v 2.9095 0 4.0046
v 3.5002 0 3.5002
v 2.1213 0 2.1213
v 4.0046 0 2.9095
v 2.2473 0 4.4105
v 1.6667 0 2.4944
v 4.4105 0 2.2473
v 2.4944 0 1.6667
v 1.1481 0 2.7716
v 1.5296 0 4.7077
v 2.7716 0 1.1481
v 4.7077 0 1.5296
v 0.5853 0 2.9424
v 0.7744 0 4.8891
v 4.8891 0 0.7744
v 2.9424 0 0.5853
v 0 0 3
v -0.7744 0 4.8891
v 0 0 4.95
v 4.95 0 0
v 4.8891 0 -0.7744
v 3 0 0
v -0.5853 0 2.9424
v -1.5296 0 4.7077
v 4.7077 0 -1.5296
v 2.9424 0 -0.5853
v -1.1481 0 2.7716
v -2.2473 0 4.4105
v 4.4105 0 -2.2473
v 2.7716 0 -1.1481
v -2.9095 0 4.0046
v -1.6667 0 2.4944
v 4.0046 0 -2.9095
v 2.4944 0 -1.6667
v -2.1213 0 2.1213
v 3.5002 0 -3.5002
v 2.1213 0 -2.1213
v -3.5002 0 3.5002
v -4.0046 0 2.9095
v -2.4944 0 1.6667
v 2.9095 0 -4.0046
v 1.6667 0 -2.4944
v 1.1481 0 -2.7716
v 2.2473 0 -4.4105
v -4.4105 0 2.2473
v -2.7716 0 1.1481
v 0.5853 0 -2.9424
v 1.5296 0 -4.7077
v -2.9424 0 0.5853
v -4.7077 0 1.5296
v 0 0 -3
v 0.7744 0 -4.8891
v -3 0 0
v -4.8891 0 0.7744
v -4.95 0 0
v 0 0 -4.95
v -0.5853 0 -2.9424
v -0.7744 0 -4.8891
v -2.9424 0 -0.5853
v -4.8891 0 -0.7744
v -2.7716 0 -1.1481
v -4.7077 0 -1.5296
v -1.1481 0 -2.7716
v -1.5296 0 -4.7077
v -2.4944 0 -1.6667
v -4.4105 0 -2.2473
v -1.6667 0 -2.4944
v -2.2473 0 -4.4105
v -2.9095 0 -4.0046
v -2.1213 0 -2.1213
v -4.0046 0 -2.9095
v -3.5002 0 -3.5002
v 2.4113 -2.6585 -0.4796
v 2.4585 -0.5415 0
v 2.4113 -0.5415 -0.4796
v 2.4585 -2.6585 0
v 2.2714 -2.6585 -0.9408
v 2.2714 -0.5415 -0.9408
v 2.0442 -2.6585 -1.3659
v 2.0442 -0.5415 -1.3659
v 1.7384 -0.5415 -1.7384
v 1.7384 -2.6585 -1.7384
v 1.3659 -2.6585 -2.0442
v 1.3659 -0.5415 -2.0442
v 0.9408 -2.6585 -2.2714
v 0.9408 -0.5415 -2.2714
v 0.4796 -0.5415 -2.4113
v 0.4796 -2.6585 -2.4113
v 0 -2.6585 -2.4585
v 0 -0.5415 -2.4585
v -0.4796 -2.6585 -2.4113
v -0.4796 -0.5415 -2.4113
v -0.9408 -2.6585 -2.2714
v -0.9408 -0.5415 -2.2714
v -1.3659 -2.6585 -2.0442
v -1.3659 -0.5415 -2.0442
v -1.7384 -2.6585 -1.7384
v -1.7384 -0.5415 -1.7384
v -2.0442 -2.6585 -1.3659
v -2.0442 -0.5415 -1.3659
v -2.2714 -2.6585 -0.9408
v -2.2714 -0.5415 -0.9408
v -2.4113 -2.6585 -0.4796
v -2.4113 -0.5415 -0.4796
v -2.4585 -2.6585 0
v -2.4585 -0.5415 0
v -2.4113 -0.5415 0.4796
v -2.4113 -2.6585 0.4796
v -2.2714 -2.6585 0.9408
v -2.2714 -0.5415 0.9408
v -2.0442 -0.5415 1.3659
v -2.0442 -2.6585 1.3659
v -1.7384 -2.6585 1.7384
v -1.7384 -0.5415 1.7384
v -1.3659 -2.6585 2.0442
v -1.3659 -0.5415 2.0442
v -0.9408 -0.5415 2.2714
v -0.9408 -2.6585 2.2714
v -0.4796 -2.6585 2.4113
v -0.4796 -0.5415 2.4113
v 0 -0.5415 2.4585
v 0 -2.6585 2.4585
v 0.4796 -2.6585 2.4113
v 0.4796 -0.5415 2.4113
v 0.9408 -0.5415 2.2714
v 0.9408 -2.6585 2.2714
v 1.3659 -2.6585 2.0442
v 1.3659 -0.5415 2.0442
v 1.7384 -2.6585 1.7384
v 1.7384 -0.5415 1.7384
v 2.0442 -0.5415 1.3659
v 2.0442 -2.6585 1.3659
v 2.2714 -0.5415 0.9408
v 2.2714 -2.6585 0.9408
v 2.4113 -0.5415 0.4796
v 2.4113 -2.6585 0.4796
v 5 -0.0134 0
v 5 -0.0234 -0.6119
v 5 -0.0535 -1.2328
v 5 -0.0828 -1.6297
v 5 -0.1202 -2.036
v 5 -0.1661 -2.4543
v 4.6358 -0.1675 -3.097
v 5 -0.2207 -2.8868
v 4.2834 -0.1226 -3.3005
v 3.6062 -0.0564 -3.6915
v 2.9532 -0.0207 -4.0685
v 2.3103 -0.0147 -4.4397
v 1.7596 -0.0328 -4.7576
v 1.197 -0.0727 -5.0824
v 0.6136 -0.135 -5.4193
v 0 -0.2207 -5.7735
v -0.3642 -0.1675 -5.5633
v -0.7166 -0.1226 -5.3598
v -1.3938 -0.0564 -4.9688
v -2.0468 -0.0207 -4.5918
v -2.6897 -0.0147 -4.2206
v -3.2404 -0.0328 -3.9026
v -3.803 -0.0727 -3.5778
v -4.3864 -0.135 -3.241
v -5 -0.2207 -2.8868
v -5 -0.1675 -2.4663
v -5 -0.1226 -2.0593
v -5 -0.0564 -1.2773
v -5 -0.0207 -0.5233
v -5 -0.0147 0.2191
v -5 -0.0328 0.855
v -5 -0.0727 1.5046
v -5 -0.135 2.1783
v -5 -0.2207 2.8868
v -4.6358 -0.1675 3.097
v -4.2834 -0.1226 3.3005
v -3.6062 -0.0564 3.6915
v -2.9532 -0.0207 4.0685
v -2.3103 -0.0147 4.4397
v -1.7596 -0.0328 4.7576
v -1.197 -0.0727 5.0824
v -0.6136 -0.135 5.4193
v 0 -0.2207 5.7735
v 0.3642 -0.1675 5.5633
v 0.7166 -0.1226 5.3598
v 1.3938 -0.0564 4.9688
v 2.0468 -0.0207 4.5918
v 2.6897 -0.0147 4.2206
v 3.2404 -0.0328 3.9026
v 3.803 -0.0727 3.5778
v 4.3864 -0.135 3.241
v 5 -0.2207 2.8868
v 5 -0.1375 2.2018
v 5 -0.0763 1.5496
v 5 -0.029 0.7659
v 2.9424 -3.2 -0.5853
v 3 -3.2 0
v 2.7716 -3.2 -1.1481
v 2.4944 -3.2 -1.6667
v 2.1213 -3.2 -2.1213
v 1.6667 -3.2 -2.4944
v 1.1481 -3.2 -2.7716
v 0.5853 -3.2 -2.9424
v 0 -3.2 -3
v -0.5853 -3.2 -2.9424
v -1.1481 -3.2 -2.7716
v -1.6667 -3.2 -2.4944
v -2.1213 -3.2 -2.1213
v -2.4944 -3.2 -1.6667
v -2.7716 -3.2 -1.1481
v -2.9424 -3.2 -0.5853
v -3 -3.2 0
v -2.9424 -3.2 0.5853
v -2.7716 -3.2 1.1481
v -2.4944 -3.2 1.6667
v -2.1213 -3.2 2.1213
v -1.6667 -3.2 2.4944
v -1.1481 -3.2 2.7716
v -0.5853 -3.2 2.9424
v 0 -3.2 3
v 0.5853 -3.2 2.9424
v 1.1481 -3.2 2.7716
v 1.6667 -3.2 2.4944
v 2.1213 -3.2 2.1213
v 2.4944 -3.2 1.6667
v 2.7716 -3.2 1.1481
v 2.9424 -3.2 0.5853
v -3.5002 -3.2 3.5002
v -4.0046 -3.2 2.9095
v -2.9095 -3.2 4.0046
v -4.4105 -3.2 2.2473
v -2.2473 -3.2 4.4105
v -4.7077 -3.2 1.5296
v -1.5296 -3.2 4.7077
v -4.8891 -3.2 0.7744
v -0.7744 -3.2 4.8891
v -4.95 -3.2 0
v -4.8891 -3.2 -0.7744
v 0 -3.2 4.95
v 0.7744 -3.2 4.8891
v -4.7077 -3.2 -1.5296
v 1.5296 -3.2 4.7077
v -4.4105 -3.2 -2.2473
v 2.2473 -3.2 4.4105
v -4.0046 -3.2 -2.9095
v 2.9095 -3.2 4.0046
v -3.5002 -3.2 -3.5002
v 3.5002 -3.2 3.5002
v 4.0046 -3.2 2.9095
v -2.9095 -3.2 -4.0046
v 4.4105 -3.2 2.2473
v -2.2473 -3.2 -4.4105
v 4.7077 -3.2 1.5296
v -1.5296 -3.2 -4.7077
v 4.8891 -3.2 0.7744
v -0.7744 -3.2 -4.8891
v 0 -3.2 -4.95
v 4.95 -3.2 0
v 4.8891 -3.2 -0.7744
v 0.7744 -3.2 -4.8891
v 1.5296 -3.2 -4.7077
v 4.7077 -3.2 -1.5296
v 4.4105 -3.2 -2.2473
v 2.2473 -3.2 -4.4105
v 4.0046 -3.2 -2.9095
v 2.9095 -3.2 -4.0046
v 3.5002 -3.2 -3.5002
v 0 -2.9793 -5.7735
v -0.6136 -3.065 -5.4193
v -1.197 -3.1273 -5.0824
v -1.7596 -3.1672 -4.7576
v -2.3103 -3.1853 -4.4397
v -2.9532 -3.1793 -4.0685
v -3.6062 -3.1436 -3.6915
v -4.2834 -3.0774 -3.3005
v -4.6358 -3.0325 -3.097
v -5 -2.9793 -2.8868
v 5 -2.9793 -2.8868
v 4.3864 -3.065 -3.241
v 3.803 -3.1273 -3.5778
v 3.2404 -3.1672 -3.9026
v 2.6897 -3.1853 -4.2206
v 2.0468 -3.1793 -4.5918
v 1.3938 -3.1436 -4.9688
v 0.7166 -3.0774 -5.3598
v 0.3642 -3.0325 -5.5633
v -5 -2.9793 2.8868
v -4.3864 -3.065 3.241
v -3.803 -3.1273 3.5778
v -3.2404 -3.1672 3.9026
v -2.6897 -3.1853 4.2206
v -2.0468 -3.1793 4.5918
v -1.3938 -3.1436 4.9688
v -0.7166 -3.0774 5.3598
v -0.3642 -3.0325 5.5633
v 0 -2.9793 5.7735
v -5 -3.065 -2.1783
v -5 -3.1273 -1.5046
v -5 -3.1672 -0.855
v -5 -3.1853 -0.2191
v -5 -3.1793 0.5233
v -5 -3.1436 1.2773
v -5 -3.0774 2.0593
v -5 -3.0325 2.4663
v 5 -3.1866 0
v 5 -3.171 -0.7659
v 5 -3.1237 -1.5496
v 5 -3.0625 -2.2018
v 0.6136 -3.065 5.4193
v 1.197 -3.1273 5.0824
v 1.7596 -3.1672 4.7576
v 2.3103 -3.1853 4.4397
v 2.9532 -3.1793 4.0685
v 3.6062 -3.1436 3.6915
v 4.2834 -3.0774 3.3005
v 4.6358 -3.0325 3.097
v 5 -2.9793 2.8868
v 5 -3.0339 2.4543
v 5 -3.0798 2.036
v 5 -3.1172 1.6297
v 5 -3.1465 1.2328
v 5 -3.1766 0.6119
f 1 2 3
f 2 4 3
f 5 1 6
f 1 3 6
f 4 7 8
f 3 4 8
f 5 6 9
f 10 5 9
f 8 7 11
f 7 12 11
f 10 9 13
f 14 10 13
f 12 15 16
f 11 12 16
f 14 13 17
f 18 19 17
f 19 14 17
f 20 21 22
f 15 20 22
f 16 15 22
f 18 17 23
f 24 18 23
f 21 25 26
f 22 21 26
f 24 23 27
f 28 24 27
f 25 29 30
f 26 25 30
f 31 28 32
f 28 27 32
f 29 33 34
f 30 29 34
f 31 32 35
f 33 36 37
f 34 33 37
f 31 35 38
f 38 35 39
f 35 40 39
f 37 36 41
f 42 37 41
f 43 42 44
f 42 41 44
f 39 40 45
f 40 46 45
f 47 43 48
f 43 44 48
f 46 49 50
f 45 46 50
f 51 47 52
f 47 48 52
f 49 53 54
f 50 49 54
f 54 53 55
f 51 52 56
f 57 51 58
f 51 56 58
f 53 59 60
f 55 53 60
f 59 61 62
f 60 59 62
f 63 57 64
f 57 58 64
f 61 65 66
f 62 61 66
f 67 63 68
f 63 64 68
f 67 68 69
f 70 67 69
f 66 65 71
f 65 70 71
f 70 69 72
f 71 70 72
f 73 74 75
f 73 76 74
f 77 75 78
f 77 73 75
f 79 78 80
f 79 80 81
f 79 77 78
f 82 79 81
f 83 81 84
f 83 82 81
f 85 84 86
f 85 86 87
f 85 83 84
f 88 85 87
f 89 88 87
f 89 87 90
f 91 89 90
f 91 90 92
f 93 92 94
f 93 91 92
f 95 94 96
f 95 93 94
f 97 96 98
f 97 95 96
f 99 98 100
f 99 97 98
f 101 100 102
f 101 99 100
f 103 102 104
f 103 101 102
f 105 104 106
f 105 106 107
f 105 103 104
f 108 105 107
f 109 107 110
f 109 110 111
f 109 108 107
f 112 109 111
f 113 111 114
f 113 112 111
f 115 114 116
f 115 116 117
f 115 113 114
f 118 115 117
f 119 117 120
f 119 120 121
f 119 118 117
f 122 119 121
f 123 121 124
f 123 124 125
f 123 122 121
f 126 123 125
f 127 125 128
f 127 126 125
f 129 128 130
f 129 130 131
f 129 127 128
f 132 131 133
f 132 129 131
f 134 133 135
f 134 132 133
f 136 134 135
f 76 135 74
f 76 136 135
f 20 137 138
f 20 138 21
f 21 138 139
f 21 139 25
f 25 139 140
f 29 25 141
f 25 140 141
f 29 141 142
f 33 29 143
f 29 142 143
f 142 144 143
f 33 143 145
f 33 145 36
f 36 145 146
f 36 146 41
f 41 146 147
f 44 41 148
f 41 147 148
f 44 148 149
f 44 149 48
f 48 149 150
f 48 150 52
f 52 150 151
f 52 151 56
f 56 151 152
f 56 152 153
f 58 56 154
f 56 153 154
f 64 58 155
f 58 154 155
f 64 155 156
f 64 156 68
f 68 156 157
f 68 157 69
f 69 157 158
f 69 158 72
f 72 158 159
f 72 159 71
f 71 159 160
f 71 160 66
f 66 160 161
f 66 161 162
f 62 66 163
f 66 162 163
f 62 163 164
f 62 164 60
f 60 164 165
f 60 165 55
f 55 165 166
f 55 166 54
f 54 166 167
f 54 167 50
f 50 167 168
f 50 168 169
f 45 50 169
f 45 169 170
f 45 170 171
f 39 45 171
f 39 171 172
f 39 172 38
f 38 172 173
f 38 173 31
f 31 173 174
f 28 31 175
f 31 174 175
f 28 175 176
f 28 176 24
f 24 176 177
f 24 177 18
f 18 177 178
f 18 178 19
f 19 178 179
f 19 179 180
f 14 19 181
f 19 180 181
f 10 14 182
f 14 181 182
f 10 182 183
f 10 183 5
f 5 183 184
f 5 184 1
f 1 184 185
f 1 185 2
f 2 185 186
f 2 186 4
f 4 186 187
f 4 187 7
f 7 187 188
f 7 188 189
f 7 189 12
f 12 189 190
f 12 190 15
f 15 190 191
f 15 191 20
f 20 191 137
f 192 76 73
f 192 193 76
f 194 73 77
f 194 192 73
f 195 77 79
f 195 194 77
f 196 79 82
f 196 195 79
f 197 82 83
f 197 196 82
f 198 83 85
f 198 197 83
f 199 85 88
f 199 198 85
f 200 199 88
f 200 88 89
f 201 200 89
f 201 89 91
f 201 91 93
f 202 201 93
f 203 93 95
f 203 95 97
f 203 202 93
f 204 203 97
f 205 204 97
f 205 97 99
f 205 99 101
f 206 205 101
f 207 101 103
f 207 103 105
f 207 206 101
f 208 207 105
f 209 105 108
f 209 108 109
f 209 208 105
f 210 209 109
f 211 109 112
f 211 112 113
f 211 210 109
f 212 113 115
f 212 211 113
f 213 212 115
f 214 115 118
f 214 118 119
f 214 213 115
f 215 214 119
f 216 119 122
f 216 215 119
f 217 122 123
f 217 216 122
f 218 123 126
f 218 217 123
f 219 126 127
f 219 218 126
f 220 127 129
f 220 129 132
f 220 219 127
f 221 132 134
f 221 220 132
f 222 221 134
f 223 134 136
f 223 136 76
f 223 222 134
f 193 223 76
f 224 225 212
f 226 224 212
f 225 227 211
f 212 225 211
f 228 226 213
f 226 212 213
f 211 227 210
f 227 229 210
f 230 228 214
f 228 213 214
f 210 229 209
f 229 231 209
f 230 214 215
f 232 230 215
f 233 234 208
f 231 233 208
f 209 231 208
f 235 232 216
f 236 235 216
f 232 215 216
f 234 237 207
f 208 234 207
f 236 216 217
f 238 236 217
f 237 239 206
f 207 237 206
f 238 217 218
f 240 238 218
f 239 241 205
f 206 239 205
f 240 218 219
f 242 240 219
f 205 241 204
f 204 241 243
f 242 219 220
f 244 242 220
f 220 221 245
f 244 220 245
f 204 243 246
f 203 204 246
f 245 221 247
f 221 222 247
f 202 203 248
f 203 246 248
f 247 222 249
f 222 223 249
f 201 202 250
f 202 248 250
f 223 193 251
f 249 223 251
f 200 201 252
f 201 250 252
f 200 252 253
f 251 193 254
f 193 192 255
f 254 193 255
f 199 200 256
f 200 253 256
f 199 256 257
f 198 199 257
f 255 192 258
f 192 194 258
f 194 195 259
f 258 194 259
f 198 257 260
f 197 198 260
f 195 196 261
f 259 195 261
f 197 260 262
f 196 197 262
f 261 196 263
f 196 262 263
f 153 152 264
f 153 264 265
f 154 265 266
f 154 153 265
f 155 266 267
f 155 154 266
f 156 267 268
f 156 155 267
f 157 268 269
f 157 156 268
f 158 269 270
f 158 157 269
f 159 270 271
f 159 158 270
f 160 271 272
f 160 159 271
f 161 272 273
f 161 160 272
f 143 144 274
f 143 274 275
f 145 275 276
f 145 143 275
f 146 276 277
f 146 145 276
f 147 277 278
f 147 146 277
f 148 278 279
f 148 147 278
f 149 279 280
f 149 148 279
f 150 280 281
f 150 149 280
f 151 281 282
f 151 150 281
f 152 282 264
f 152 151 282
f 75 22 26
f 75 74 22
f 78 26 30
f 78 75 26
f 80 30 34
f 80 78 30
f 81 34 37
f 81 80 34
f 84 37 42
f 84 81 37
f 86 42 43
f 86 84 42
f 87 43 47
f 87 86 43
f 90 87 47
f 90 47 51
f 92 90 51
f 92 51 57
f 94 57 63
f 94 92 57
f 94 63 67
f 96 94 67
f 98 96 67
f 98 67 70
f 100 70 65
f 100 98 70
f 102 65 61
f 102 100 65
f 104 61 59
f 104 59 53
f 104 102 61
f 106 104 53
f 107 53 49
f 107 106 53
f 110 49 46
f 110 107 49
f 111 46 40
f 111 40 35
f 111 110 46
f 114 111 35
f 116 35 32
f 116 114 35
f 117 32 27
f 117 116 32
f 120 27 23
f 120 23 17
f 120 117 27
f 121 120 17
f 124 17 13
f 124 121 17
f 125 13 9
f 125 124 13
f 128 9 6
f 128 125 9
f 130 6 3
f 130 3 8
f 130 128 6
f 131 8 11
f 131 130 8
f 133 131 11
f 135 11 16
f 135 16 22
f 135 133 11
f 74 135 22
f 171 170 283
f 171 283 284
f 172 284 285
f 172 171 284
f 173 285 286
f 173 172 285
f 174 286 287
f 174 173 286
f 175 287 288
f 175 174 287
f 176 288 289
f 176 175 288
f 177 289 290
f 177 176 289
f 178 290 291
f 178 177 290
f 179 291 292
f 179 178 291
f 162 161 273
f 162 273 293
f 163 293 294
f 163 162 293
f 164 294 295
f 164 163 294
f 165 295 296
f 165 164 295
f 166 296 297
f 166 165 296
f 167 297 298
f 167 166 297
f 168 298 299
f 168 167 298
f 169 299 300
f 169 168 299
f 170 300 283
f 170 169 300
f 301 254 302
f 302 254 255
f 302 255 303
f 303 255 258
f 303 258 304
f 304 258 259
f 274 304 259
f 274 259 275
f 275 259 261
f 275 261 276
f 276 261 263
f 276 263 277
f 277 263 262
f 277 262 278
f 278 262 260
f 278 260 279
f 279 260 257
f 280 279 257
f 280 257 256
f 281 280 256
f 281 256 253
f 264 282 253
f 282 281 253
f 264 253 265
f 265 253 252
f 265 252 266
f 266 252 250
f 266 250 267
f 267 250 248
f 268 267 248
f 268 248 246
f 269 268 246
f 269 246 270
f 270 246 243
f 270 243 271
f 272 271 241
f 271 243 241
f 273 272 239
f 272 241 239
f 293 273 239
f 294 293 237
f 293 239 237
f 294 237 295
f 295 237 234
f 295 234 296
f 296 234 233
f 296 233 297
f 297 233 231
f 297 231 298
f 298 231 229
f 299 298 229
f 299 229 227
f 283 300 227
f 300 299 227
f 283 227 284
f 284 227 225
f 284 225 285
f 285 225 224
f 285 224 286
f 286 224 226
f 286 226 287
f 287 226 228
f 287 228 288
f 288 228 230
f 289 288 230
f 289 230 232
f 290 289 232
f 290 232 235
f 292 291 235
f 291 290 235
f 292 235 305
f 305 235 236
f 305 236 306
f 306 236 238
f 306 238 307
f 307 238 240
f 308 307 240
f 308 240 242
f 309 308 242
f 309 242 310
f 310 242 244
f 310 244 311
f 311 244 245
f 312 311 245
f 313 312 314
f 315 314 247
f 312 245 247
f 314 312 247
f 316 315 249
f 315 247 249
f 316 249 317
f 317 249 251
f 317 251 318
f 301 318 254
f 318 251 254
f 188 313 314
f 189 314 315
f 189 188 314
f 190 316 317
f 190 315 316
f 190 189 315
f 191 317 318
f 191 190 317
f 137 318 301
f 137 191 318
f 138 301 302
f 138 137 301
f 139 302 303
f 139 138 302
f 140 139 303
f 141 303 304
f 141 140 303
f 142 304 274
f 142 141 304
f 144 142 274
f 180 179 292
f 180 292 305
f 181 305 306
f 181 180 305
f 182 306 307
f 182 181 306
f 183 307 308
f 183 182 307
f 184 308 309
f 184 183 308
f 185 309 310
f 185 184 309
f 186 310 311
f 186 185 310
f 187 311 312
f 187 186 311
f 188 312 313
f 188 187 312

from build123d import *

# Parameters (mm, degrees)
CUT_EXTRUDE1_DEPTH      = 4.2
CUT_EXTRUDE1_DEPTH_BACK = 4.2
SKETCH2_W               = 40
SKETCH2_H               = 40


with BuildPart() as part:
    # Sketch1 → Revolve1 (revolve)
    with BuildSketch(Plane.XY):
        Polygon((0, 0), (4.95, 0), (10.921281292, -1.6), (4.95, -3.2), (0, -3.2), align=None)
    revolve(axis=Axis((0, -3.2, 0), (0, 1, 0)))

    # Sketch2 → Cut-Extrude1 (cut, two sides: drawn at the far end of the back side and taken through both)
    with BuildSketch(Plane(origin=(0, 0, 0), x_dir=(1, 0, 0), z_dir=(0, 1, 0)).offset(-CUT_EXTRUDE1_DEPTH_BACK)):
        Rectangle(SKETCH2_W, SKETCH2_H)
        Polygon((-5, -2.886751346), (0, -5.773502692), (5, -2.886751346), (5, 2.886751346), (0, 5.773502692), (-5, 2.886751346), align=None, mode=Mode.SUBTRACT)
    extrude(amount=CUT_EXTRUDE1_DEPTH + CUT_EXTRUDE1_DEPTH_BACK, mode=Mode.SUBTRACT)

    # Sketch3 → Cut-Revolve1 (revolve, cut)
    with BuildSketch(Plane.XY):
        Polygon((0, 0), (3, 0), (2.4585, -0.5415), (2.4585, -2.6585), (3, -3.2), (0, -3.2), align=None)
    revolve(axis=Axis((0, -3.2, 0), (0, 1, 0)), mode=Mode.SUBTRACT)


solid = part.part
